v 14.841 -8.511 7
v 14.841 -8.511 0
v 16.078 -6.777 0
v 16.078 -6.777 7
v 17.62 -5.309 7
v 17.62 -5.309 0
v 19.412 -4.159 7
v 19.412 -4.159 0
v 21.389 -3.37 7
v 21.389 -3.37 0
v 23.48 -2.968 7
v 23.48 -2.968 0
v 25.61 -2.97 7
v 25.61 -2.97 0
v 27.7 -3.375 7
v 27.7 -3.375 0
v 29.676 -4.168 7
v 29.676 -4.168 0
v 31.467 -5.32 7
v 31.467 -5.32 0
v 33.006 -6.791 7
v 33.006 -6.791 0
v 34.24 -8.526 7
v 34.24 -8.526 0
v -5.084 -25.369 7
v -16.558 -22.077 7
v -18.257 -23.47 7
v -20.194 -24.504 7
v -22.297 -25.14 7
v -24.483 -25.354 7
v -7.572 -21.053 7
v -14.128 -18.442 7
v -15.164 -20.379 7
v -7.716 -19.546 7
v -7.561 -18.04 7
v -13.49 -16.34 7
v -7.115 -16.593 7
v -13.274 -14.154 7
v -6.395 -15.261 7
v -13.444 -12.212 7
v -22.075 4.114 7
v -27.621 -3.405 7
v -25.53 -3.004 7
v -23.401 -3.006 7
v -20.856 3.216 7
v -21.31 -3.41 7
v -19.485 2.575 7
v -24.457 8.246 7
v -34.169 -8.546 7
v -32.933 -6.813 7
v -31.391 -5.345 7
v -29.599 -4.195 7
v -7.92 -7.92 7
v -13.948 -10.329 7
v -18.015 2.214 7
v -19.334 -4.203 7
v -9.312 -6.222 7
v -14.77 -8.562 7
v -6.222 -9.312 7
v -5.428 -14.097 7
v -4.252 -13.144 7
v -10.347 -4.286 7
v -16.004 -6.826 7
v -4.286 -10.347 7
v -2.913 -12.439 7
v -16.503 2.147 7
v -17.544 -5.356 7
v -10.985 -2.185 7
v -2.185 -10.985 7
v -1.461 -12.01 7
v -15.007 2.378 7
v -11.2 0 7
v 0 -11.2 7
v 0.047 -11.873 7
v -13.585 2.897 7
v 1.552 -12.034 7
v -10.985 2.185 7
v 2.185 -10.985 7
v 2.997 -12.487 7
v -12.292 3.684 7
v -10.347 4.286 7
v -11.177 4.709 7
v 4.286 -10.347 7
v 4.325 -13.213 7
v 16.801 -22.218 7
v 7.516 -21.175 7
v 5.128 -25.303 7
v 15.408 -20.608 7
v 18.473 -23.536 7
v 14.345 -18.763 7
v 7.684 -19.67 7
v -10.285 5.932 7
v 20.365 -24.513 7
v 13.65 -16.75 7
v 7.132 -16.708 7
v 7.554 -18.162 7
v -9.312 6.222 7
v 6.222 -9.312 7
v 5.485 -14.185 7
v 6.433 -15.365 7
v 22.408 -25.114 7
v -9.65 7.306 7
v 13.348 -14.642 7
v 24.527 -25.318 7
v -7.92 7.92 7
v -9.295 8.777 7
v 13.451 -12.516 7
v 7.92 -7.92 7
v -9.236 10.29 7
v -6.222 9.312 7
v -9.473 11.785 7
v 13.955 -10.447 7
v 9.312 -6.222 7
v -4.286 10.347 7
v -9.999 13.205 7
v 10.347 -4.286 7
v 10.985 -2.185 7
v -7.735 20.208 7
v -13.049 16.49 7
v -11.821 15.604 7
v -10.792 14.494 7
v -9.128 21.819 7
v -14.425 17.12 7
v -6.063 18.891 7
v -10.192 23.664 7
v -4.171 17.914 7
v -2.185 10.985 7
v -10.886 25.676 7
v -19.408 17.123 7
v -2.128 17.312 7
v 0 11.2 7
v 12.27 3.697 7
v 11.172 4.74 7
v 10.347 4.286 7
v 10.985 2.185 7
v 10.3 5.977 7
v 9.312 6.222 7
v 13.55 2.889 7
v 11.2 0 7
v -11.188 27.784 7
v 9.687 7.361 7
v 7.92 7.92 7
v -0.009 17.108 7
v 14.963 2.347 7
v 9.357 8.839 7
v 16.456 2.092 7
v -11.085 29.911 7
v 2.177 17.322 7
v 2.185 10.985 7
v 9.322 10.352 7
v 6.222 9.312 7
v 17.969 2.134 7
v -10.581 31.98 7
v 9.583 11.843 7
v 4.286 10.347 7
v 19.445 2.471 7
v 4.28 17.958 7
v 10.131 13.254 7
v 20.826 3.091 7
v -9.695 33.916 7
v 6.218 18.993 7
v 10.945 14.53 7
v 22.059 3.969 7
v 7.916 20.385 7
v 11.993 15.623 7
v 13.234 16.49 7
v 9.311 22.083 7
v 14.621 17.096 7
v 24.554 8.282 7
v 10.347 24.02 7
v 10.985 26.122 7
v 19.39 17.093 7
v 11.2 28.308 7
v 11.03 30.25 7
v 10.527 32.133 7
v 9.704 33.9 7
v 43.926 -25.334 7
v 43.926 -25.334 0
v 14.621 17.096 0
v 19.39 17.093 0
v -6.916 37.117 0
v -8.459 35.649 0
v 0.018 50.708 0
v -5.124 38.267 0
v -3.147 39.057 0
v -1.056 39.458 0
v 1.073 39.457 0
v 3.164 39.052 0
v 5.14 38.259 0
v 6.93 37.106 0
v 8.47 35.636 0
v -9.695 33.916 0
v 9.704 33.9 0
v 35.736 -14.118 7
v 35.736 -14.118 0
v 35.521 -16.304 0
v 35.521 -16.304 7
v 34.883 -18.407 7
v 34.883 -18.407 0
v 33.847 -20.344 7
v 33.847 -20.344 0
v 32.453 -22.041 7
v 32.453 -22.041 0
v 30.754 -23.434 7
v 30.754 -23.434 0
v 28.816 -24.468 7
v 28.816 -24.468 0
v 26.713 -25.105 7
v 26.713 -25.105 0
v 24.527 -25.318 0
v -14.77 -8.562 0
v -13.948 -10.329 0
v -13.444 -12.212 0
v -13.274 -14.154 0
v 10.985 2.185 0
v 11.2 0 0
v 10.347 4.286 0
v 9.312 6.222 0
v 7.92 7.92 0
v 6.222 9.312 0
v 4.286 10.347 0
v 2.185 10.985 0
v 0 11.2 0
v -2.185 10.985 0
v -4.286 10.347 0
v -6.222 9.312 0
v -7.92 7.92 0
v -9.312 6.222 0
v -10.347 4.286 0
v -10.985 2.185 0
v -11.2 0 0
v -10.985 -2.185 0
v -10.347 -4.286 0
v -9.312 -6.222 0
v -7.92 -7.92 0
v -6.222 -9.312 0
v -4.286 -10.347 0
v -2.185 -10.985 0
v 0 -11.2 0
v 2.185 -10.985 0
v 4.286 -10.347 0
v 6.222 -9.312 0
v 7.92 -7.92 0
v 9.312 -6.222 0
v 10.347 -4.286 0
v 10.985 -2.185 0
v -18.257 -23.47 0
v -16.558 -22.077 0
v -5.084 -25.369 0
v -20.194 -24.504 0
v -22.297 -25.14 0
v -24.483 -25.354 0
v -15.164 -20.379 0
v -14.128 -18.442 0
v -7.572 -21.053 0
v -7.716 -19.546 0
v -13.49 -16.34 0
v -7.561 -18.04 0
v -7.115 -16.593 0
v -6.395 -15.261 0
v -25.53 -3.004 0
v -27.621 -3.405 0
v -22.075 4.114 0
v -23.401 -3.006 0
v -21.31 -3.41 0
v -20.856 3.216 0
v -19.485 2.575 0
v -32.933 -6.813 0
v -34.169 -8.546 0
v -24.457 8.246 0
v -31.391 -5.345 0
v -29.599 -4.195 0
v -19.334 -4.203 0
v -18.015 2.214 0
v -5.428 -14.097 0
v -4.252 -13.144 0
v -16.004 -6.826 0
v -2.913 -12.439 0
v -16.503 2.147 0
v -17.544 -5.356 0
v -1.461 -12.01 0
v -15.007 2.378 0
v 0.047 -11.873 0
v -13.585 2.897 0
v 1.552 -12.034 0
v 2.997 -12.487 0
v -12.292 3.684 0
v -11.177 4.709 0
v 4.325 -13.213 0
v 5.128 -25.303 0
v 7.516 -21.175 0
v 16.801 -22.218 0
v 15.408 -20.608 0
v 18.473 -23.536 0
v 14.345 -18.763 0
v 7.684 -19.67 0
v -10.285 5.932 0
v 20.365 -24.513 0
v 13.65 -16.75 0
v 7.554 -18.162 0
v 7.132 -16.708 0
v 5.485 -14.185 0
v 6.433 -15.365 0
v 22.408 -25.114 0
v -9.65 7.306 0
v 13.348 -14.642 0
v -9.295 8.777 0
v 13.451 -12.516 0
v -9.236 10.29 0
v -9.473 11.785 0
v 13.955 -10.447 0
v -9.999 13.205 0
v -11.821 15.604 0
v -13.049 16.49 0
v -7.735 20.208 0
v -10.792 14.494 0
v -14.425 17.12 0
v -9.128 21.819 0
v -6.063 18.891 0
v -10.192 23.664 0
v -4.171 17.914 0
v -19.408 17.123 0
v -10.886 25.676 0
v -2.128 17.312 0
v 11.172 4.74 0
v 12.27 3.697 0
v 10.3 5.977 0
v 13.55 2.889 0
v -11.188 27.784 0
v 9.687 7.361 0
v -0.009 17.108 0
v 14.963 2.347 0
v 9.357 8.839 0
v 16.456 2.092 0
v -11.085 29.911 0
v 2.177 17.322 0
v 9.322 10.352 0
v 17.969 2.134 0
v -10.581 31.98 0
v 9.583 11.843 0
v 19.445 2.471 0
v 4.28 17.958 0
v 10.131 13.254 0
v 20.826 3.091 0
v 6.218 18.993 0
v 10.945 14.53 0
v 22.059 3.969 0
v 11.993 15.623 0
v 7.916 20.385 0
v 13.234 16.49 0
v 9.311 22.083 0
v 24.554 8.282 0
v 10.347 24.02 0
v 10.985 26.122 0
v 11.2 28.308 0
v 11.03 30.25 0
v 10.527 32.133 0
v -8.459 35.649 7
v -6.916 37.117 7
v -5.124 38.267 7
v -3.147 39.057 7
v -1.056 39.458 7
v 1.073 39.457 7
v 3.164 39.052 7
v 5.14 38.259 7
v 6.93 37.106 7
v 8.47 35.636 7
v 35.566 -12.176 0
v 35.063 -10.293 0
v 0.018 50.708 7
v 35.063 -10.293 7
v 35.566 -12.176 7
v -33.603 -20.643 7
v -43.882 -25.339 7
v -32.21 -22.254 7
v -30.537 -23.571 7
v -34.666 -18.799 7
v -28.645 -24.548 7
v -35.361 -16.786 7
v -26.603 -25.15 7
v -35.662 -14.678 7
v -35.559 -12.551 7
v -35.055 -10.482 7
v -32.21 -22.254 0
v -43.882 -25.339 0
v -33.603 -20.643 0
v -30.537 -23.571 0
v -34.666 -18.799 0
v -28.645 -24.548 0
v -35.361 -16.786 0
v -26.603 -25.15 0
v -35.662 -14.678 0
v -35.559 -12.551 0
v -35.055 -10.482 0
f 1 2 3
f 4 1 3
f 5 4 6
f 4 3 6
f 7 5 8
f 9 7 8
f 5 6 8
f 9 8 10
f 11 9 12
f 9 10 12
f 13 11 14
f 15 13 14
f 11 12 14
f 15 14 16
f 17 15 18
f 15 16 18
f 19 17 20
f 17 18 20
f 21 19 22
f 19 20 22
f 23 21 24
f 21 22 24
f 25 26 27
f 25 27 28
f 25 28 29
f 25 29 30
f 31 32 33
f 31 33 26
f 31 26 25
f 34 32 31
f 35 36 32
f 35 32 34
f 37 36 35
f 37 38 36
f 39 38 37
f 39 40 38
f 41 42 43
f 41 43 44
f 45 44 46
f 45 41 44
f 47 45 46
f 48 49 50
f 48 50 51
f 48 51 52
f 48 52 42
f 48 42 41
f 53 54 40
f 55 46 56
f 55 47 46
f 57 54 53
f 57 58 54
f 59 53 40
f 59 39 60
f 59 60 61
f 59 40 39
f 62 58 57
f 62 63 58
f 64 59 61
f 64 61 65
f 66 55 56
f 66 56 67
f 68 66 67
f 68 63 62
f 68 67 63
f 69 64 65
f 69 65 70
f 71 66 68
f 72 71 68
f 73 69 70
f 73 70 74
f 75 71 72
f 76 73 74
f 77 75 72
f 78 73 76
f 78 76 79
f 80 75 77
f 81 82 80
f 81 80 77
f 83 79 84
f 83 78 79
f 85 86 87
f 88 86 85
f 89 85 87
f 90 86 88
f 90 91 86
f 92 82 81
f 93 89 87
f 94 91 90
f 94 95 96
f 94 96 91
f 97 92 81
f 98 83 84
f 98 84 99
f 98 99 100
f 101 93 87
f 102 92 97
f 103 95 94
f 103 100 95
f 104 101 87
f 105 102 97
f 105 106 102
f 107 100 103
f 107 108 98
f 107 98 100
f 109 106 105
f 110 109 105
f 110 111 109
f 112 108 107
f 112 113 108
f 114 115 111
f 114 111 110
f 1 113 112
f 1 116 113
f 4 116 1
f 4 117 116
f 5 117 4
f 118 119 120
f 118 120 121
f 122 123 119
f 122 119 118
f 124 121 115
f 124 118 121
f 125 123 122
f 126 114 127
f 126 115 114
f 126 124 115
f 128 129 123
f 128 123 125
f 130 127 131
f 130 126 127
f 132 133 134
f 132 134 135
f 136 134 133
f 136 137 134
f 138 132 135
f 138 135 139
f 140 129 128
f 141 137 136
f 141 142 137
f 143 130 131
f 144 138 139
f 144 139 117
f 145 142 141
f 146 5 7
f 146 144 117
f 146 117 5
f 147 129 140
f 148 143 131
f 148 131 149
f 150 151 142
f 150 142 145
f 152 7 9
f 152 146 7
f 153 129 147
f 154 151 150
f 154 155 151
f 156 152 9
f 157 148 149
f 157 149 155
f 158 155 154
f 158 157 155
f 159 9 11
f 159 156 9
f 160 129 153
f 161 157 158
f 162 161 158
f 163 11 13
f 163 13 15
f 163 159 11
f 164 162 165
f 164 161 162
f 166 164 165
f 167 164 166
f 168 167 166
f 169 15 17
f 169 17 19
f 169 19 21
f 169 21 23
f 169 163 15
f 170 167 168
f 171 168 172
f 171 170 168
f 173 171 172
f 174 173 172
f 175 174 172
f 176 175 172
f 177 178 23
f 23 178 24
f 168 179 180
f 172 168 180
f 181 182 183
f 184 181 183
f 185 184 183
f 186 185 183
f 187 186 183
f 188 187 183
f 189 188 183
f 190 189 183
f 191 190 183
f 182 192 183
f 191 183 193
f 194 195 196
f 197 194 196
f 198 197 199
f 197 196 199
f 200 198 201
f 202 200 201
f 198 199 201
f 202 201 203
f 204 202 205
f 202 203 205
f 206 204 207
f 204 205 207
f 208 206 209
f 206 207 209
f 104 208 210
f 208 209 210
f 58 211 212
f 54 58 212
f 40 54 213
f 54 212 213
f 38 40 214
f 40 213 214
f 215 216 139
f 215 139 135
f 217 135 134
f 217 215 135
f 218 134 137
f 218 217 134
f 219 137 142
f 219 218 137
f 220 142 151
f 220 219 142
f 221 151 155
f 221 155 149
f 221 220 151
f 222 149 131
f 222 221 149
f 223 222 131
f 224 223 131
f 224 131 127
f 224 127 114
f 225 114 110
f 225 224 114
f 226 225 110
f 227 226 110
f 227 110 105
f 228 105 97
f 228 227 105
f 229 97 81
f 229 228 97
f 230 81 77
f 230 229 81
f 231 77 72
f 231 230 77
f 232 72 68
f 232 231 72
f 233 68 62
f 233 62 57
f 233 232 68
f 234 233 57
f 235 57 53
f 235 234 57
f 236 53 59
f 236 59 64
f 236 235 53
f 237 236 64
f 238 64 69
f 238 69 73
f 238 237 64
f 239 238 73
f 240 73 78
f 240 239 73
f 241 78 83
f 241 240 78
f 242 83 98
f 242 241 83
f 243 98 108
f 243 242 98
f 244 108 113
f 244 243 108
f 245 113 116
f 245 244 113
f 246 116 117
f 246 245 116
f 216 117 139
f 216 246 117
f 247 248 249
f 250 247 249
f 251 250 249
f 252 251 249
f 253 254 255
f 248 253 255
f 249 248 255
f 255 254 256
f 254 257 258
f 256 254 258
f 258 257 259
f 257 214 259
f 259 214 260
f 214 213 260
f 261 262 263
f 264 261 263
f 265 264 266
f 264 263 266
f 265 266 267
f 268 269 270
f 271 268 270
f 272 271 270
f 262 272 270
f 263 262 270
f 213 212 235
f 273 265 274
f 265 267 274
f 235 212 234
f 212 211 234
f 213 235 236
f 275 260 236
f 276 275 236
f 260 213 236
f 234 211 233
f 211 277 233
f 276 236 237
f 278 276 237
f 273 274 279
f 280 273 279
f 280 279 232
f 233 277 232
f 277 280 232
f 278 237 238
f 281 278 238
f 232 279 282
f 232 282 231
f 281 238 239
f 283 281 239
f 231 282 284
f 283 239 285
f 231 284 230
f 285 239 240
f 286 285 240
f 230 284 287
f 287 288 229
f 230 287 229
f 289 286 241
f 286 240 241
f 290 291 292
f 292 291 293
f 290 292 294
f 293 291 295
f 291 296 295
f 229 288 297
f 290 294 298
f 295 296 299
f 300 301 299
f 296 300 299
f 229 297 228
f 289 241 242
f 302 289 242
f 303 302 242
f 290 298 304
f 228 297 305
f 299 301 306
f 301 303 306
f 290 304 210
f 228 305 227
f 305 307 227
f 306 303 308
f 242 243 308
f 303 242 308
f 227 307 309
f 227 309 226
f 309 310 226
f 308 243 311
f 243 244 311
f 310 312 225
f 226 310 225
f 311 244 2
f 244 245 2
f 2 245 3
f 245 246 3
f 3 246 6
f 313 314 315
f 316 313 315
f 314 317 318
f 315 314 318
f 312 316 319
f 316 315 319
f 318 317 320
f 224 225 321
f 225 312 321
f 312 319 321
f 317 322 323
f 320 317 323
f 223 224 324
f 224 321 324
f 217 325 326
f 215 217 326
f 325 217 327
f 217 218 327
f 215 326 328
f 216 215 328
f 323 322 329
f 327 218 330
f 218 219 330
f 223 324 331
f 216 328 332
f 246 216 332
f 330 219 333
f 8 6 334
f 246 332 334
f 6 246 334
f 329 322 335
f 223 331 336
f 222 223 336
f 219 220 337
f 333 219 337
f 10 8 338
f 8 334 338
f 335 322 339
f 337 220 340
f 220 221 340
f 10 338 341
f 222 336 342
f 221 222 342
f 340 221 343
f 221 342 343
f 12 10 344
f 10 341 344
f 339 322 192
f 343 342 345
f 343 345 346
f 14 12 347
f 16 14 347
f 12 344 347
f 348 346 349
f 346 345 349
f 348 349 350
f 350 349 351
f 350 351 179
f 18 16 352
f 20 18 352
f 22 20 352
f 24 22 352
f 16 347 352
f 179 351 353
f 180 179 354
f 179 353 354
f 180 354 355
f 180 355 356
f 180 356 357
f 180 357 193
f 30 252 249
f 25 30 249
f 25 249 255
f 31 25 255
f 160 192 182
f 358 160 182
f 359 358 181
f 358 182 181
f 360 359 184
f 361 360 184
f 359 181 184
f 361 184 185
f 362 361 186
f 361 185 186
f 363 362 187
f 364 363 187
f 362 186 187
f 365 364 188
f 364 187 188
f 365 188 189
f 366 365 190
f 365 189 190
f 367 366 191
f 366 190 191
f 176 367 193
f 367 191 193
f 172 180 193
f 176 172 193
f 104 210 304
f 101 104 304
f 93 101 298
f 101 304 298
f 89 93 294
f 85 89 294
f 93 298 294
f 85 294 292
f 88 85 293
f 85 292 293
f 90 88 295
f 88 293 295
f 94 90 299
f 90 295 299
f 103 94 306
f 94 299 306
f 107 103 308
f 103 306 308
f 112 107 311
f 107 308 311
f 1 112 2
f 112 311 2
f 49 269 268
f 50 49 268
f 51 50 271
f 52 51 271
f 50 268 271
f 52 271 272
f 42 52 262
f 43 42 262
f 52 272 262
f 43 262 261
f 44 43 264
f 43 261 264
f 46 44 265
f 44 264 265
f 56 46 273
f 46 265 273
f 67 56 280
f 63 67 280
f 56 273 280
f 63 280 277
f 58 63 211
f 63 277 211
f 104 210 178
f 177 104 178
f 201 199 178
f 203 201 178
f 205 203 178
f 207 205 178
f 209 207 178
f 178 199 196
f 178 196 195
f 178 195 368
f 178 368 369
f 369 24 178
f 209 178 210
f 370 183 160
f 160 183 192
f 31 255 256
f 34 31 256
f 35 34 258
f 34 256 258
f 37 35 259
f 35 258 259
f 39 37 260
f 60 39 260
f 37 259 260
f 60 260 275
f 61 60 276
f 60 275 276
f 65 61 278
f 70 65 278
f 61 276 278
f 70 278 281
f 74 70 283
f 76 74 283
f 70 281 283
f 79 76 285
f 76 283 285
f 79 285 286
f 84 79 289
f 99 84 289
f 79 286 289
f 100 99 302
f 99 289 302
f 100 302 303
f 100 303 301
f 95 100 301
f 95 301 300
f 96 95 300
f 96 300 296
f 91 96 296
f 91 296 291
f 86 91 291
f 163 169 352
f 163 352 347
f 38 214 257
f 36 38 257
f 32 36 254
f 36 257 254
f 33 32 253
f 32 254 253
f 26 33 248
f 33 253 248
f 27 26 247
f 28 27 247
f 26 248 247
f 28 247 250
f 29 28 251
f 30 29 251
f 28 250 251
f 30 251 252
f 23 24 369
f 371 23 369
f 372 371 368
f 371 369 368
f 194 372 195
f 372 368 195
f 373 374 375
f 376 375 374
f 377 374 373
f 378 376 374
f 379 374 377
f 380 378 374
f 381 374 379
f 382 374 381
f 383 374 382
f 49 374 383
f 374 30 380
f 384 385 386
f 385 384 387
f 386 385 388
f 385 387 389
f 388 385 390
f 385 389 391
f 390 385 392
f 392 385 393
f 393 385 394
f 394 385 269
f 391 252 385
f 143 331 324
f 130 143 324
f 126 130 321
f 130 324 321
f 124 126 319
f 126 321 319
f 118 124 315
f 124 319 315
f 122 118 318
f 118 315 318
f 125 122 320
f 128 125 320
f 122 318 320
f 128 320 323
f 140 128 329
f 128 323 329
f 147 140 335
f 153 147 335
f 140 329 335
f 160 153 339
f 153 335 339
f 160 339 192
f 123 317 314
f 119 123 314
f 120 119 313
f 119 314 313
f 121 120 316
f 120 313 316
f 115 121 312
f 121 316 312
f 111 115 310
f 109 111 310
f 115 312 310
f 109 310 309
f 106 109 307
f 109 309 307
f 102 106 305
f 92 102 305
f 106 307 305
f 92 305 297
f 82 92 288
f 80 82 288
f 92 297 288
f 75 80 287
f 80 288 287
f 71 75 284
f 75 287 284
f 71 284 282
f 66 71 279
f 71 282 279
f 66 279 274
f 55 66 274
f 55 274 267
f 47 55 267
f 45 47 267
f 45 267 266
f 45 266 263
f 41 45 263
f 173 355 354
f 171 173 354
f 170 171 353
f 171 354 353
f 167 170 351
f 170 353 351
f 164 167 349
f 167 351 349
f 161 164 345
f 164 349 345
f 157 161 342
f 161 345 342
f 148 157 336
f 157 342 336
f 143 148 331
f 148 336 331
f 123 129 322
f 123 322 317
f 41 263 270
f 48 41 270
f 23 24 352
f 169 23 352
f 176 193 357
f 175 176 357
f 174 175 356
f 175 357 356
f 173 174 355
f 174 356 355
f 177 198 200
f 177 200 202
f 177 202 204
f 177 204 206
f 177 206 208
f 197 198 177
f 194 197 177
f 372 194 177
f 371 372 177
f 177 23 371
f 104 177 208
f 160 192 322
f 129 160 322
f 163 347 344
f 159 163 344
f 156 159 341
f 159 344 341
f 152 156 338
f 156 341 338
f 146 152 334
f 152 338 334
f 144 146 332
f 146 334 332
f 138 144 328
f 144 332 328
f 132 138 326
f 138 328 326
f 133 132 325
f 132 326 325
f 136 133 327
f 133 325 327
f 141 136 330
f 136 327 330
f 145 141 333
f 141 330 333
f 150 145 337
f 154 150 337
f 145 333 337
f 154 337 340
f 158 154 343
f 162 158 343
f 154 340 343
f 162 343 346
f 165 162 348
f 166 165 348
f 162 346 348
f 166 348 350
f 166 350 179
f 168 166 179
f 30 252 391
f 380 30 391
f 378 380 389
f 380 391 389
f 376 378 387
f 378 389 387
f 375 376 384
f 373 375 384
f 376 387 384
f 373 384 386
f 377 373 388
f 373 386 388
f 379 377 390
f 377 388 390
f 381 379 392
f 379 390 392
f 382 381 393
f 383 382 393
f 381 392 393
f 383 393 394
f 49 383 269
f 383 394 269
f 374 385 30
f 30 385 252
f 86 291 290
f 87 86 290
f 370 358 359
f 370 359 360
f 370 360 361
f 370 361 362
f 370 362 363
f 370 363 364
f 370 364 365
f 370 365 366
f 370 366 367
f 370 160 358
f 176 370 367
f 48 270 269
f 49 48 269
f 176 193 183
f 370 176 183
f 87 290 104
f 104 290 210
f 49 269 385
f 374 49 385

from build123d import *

# Parameters (mm, degrees)
F1_DEPTH = 7
F0_R     = 11.2


with BuildPart() as f1:
    # F0 (on Top) → F1 (new body)
    with BuildSketch(Plane.XY):
        with BuildLine():
            Line((0.017817163, 50.70805789), (-9.6950270976, 33.915778376))
            ThreePointArc((-9.6950270976, 33.915778376), (0.0089093351, 39.5080614323), (9.7039364318, 33.9003469546))
            Line((9.7039364318, 33.9003469546), (0.017817163, 50.70805789))
        make_face()
    extrude(amount=F1_DEPTH)


with BuildPart() as f1b:
    # F0 (on Top) → F1, piece 2 (new body)
    with BuildSketch(Plane.XY):
        with BuildLine():
            Line((14.6211081289, 17.0964316673), (19.3900543266, 17.0926384031))
            ThreePointArc((19.3900543266, 17.0926384031), (17.0058822943, 17.473040229), (14.6211081289, 17.0964316673))
        make_face()
        with BuildLine():
            ThreePointArc((-14.4253563092, 17.1195354957), (-16.9162844819, 17.5356654608), (-19.4078714897, 17.1234986347))
            Line((-19.4078714897, 17.1234986347), (-14.4253563092, 17.1195354957))
        make_face()
        with BuildLine():
            ThreePointArc((-24.4565133276, 8.2459276768), (-23.5938649563, 5.9909732168), (-22.0753252919, 4.1140024881))
            Line((-22.0753252919, 4.1140024881), (-24.4565133276, 8.2459276768))
        make_face()
        with BuildLine():
            Line((-5.084276164, -25.3694918101), (-7.5721015751, -21.0525255196))
            ThreePointArc((-7.5721015751, -21.0525255196), (-6.6870166098, -23.4177975787), (-5.084276164, -25.3694918101))
        make_face()
        with BuildLine():
            ThreePointArc((5.1282467285, -25.3029584173), (6.6497703895, -23.4284057834), (7.5160048905, -21.174826493))
            Line((7.5160048905, -21.174826493), (5.1282467285, -25.3029584173))
        make_face()
        with BuildLine():
            Line((24.5539353812, 8.2816008379), (22.0592456119, 3.9685976864))
            ThreePointArc((22.0592456119, 3.9685976864), (23.6650888193, 5.9177397804), (24.5539353812, 8.2816008379))
        make_face()
        with BuildLine():
            Line((-9.6950270976, 33.915778376), (-19.4078714897, 17.1234986347))
            ThreePointArc((-19.4078714897, 17.1234986347), (-16.9162844819, 17.5356654608), (-14.4253563092, 17.1195354957))
            Line((-14.4253563092, 17.1195354957), (-0.008908689, 17.108068519))
            ThreePointArc((-0.008908689, 17.108068519), (-9.7039358045, 22.7157819088), (-9.6950270976, 33.915778376))
        make_face()
        with BuildLine():
            Line((19.3900543266, 17.0926384031), (9.7039364318, 33.9003469546))
            ThreePointArc((9.7039364318, 33.9003469546), (10.819521432, 31.2025348725), (11.2, 28.3080649759))
            ThreePointArc((11.2, 28.3080649759), (7.9164456255, 20.3853199555), (-0.008908689, 17.108068519))
            Line((-0.008908689, 17.108068519), (14.6211081289, 17.0964316673))
            ThreePointArc((14.6211081289, 17.0964316673), (17.0058822943, 17.473040229), (19.3900543266, 17.0926384031))
        make_face()
        with BuildLine():
            Line((-14.7703940663, -8.5617832457), (-22.0753252919, 4.1140024881))
            ThreePointArc((-22.0753252919, 4.1140024881), (-23.5938649563, 5.9909732168), (-24.4565133276, 8.2459276768))
            Line((-24.4565133276, 8.2459276768), (-34.1693577364, -8.5463520935))
            ThreePointArc((-34.1693577364, -8.5463520935), (-24.465421311, -2.9540687807), (-14.7703940663, -8.5617832457))
        make_face()
        with BuildLine():
            Line((-7.5721015751, -21.0525255196), (-14.7703940663, -8.5617832457))
            ThreePointArc((-14.7703940663, -8.5617832457), (-13.6548090605, -11.2595953335), (-13.2743304906, -14.1540652373))
            ThreePointArc((-13.2743304906, -14.1540652373), (-16.557884868, -22.0768102606), (-24.4832391879, -25.3540616942))
            Line((-24.4832391879, -25.3540616942), (-5.084276164, -25.3694918101))
            ThreePointArc((-5.084276164, -25.3694918101), (-6.6870166098, -23.4177975787), (-7.5721015751, -21.0525255196))
        make_face()
        with BuildLine():
            ThreePointArc((24.5272095209, -25.3183885331), (14.8321824486, -19.7106752038), (14.8410910465, -8.5106788041))
            Line((14.8410910465, -8.5106788041), (7.5160048905, -21.174826493))
            ThreePointArc((7.5160048905, -21.174826493), (6.6497703895, -23.4284057834), (5.1282467285, -25.3029584173))
            Line((5.1282467285, -25.3029584173), (24.5272095209, -25.3183885331))
        make_face()
        with BuildLine():
            ThreePointArc((24.5539353812, 8.2816008379), (23.6650888193, 5.9177397804), (22.0592456119, 3.9685976864))
            Line((22.0592456119, 3.9685976864), (14.8410910465, -8.5106788041))
            ThreePointArc((14.8410910465, -8.5106788041), (24.5450275316, -2.9183956197), (34.2400547022, -8.5261101882))
            Line((34.2400547022, -8.5261101882), (24.5539353812, 8.2816008379))
        make_face()
        with BuildLine():
            Line((-0.008908689, 17.108068519), (-14.4253563092, 17.1195354957))
            ThreePointArc((-14.4253563092, 17.1195354957), (-10.285438835, 5.9317435531), (-22.0753252919, 4.1140024881))
            Line((-22.0753252919, 4.1140024881), (-14.7703940663, -8.5617832457))
            Line((-14.7703940663, -8.5617832457), (-7.5721015751, -21.0525255196))
            ThreePointArc((-7.5721015751, -21.0525255196), (0.0468517223, -11.873355846), (7.5160048905, -21.174826493))
            Line((7.5160048905, -21.174826493), (14.8410910465, -8.5106788041))
            Line((14.8410910465, -8.5106788041), (22.0592456119, 3.9685976864))
            ThreePointArc((22.0592456119, 3.9685976864), (10.3003748402, 5.9772199555), (14.6211081289, 17.0964316673))
            Line((14.6211081289, 17.0964316673), (-0.008908689, 17.108068519))
        make_face()
        Circle(F0_R, mode=Mode.SUBTRACT)
    extrude(amount=F1_DEPTH)


with BuildPart() as f1c:
    # F0 (on Top) → F1, piece 3 (new body)
    with BuildSketch(Plane.XY):
        with BuildLine():
            ThreePointArc((-24.4832391879, -25.3540616942), (-34.1782662232, -19.7463484291), (-34.1693577364, -8.5463520935))
            Line((-34.1693577364, -8.5463520935), (-43.8822019802, -25.3386315785))
            Line((-43.8822019802, -25.3386315785), (-24.4832391879, -25.3540616942))
        make_face()
    extrude(amount=F1_DEPTH)


with BuildPart() as f1d:
    # F0 (on Top) → F1, piece 4 (new body)
    with BuildSketch(Plane.XY):
        with BuildLine():
            Line((43.9261725448, -25.333818649), (34.2400547022, -8.5261101882))
            ThreePointArc((34.2400547022, -8.5261101882), (35.3556396637, -11.2239222301), (35.7361182182, -14.1183920761))
            ThreePointArc((35.7361182182, -14.1183920761), (32.4525638407, -22.0411370995), (24.5272095209, -25.3183885331))
            Line((24.5272095209, -25.3183885331), (43.9261725448, -25.333818649))
        make_face()
    extrude(amount=F1_DEPTH)


solid = Compound([f1.part, f1b.part, f1c.part, f1d.part])
